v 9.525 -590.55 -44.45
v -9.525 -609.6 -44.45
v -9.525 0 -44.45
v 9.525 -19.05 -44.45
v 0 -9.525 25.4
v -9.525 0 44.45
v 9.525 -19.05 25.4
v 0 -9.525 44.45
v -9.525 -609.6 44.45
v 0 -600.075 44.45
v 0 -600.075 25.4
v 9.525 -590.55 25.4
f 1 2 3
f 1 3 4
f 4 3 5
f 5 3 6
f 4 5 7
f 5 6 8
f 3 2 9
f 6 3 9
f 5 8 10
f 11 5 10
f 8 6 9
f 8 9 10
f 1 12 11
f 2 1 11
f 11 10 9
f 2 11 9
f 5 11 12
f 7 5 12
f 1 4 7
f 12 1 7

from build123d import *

# Parameters (mm, degrees)
F0_W     = 19.05
F0_H     = 88.9
F1_DEPTH = 609.6
F3_DEPTH = 88.901
F5_DEPTH = 19.05


with BuildPart() as f1:
    # F0 (on Front) → F1 (new body)
    with BuildSketch(Plane.XZ):
        Rectangle(F0_W, F0_H)
    extrude(amount=F1_DEPTH)

    # F2 (on face) → F3 (cut, through all)
    with BuildSketch(Plane.XY.offset(44.45)):
        Polygon((9.525, -590.55), (-9.525, -609.6), (9.525, -609.6), align=None)
        Polygon((9.525, 0), (-9.525, 0), (9.525, -19.05), align=None)
    extrude(amount=-F3_DEPTH, mode=Mode.SUBTRACT)

    # F4 (on face) → F5 (cut)
    with BuildSketch(Plane.XY.offset(44.45)):
        Polygon((0, -9.525), (0, -600.075), (9.525, -590.55), (9.525, -19.05), align=None)
    extrude(amount=-F5_DEPTH, mode=Mode.SUBTRACT)


solid = f1.part
